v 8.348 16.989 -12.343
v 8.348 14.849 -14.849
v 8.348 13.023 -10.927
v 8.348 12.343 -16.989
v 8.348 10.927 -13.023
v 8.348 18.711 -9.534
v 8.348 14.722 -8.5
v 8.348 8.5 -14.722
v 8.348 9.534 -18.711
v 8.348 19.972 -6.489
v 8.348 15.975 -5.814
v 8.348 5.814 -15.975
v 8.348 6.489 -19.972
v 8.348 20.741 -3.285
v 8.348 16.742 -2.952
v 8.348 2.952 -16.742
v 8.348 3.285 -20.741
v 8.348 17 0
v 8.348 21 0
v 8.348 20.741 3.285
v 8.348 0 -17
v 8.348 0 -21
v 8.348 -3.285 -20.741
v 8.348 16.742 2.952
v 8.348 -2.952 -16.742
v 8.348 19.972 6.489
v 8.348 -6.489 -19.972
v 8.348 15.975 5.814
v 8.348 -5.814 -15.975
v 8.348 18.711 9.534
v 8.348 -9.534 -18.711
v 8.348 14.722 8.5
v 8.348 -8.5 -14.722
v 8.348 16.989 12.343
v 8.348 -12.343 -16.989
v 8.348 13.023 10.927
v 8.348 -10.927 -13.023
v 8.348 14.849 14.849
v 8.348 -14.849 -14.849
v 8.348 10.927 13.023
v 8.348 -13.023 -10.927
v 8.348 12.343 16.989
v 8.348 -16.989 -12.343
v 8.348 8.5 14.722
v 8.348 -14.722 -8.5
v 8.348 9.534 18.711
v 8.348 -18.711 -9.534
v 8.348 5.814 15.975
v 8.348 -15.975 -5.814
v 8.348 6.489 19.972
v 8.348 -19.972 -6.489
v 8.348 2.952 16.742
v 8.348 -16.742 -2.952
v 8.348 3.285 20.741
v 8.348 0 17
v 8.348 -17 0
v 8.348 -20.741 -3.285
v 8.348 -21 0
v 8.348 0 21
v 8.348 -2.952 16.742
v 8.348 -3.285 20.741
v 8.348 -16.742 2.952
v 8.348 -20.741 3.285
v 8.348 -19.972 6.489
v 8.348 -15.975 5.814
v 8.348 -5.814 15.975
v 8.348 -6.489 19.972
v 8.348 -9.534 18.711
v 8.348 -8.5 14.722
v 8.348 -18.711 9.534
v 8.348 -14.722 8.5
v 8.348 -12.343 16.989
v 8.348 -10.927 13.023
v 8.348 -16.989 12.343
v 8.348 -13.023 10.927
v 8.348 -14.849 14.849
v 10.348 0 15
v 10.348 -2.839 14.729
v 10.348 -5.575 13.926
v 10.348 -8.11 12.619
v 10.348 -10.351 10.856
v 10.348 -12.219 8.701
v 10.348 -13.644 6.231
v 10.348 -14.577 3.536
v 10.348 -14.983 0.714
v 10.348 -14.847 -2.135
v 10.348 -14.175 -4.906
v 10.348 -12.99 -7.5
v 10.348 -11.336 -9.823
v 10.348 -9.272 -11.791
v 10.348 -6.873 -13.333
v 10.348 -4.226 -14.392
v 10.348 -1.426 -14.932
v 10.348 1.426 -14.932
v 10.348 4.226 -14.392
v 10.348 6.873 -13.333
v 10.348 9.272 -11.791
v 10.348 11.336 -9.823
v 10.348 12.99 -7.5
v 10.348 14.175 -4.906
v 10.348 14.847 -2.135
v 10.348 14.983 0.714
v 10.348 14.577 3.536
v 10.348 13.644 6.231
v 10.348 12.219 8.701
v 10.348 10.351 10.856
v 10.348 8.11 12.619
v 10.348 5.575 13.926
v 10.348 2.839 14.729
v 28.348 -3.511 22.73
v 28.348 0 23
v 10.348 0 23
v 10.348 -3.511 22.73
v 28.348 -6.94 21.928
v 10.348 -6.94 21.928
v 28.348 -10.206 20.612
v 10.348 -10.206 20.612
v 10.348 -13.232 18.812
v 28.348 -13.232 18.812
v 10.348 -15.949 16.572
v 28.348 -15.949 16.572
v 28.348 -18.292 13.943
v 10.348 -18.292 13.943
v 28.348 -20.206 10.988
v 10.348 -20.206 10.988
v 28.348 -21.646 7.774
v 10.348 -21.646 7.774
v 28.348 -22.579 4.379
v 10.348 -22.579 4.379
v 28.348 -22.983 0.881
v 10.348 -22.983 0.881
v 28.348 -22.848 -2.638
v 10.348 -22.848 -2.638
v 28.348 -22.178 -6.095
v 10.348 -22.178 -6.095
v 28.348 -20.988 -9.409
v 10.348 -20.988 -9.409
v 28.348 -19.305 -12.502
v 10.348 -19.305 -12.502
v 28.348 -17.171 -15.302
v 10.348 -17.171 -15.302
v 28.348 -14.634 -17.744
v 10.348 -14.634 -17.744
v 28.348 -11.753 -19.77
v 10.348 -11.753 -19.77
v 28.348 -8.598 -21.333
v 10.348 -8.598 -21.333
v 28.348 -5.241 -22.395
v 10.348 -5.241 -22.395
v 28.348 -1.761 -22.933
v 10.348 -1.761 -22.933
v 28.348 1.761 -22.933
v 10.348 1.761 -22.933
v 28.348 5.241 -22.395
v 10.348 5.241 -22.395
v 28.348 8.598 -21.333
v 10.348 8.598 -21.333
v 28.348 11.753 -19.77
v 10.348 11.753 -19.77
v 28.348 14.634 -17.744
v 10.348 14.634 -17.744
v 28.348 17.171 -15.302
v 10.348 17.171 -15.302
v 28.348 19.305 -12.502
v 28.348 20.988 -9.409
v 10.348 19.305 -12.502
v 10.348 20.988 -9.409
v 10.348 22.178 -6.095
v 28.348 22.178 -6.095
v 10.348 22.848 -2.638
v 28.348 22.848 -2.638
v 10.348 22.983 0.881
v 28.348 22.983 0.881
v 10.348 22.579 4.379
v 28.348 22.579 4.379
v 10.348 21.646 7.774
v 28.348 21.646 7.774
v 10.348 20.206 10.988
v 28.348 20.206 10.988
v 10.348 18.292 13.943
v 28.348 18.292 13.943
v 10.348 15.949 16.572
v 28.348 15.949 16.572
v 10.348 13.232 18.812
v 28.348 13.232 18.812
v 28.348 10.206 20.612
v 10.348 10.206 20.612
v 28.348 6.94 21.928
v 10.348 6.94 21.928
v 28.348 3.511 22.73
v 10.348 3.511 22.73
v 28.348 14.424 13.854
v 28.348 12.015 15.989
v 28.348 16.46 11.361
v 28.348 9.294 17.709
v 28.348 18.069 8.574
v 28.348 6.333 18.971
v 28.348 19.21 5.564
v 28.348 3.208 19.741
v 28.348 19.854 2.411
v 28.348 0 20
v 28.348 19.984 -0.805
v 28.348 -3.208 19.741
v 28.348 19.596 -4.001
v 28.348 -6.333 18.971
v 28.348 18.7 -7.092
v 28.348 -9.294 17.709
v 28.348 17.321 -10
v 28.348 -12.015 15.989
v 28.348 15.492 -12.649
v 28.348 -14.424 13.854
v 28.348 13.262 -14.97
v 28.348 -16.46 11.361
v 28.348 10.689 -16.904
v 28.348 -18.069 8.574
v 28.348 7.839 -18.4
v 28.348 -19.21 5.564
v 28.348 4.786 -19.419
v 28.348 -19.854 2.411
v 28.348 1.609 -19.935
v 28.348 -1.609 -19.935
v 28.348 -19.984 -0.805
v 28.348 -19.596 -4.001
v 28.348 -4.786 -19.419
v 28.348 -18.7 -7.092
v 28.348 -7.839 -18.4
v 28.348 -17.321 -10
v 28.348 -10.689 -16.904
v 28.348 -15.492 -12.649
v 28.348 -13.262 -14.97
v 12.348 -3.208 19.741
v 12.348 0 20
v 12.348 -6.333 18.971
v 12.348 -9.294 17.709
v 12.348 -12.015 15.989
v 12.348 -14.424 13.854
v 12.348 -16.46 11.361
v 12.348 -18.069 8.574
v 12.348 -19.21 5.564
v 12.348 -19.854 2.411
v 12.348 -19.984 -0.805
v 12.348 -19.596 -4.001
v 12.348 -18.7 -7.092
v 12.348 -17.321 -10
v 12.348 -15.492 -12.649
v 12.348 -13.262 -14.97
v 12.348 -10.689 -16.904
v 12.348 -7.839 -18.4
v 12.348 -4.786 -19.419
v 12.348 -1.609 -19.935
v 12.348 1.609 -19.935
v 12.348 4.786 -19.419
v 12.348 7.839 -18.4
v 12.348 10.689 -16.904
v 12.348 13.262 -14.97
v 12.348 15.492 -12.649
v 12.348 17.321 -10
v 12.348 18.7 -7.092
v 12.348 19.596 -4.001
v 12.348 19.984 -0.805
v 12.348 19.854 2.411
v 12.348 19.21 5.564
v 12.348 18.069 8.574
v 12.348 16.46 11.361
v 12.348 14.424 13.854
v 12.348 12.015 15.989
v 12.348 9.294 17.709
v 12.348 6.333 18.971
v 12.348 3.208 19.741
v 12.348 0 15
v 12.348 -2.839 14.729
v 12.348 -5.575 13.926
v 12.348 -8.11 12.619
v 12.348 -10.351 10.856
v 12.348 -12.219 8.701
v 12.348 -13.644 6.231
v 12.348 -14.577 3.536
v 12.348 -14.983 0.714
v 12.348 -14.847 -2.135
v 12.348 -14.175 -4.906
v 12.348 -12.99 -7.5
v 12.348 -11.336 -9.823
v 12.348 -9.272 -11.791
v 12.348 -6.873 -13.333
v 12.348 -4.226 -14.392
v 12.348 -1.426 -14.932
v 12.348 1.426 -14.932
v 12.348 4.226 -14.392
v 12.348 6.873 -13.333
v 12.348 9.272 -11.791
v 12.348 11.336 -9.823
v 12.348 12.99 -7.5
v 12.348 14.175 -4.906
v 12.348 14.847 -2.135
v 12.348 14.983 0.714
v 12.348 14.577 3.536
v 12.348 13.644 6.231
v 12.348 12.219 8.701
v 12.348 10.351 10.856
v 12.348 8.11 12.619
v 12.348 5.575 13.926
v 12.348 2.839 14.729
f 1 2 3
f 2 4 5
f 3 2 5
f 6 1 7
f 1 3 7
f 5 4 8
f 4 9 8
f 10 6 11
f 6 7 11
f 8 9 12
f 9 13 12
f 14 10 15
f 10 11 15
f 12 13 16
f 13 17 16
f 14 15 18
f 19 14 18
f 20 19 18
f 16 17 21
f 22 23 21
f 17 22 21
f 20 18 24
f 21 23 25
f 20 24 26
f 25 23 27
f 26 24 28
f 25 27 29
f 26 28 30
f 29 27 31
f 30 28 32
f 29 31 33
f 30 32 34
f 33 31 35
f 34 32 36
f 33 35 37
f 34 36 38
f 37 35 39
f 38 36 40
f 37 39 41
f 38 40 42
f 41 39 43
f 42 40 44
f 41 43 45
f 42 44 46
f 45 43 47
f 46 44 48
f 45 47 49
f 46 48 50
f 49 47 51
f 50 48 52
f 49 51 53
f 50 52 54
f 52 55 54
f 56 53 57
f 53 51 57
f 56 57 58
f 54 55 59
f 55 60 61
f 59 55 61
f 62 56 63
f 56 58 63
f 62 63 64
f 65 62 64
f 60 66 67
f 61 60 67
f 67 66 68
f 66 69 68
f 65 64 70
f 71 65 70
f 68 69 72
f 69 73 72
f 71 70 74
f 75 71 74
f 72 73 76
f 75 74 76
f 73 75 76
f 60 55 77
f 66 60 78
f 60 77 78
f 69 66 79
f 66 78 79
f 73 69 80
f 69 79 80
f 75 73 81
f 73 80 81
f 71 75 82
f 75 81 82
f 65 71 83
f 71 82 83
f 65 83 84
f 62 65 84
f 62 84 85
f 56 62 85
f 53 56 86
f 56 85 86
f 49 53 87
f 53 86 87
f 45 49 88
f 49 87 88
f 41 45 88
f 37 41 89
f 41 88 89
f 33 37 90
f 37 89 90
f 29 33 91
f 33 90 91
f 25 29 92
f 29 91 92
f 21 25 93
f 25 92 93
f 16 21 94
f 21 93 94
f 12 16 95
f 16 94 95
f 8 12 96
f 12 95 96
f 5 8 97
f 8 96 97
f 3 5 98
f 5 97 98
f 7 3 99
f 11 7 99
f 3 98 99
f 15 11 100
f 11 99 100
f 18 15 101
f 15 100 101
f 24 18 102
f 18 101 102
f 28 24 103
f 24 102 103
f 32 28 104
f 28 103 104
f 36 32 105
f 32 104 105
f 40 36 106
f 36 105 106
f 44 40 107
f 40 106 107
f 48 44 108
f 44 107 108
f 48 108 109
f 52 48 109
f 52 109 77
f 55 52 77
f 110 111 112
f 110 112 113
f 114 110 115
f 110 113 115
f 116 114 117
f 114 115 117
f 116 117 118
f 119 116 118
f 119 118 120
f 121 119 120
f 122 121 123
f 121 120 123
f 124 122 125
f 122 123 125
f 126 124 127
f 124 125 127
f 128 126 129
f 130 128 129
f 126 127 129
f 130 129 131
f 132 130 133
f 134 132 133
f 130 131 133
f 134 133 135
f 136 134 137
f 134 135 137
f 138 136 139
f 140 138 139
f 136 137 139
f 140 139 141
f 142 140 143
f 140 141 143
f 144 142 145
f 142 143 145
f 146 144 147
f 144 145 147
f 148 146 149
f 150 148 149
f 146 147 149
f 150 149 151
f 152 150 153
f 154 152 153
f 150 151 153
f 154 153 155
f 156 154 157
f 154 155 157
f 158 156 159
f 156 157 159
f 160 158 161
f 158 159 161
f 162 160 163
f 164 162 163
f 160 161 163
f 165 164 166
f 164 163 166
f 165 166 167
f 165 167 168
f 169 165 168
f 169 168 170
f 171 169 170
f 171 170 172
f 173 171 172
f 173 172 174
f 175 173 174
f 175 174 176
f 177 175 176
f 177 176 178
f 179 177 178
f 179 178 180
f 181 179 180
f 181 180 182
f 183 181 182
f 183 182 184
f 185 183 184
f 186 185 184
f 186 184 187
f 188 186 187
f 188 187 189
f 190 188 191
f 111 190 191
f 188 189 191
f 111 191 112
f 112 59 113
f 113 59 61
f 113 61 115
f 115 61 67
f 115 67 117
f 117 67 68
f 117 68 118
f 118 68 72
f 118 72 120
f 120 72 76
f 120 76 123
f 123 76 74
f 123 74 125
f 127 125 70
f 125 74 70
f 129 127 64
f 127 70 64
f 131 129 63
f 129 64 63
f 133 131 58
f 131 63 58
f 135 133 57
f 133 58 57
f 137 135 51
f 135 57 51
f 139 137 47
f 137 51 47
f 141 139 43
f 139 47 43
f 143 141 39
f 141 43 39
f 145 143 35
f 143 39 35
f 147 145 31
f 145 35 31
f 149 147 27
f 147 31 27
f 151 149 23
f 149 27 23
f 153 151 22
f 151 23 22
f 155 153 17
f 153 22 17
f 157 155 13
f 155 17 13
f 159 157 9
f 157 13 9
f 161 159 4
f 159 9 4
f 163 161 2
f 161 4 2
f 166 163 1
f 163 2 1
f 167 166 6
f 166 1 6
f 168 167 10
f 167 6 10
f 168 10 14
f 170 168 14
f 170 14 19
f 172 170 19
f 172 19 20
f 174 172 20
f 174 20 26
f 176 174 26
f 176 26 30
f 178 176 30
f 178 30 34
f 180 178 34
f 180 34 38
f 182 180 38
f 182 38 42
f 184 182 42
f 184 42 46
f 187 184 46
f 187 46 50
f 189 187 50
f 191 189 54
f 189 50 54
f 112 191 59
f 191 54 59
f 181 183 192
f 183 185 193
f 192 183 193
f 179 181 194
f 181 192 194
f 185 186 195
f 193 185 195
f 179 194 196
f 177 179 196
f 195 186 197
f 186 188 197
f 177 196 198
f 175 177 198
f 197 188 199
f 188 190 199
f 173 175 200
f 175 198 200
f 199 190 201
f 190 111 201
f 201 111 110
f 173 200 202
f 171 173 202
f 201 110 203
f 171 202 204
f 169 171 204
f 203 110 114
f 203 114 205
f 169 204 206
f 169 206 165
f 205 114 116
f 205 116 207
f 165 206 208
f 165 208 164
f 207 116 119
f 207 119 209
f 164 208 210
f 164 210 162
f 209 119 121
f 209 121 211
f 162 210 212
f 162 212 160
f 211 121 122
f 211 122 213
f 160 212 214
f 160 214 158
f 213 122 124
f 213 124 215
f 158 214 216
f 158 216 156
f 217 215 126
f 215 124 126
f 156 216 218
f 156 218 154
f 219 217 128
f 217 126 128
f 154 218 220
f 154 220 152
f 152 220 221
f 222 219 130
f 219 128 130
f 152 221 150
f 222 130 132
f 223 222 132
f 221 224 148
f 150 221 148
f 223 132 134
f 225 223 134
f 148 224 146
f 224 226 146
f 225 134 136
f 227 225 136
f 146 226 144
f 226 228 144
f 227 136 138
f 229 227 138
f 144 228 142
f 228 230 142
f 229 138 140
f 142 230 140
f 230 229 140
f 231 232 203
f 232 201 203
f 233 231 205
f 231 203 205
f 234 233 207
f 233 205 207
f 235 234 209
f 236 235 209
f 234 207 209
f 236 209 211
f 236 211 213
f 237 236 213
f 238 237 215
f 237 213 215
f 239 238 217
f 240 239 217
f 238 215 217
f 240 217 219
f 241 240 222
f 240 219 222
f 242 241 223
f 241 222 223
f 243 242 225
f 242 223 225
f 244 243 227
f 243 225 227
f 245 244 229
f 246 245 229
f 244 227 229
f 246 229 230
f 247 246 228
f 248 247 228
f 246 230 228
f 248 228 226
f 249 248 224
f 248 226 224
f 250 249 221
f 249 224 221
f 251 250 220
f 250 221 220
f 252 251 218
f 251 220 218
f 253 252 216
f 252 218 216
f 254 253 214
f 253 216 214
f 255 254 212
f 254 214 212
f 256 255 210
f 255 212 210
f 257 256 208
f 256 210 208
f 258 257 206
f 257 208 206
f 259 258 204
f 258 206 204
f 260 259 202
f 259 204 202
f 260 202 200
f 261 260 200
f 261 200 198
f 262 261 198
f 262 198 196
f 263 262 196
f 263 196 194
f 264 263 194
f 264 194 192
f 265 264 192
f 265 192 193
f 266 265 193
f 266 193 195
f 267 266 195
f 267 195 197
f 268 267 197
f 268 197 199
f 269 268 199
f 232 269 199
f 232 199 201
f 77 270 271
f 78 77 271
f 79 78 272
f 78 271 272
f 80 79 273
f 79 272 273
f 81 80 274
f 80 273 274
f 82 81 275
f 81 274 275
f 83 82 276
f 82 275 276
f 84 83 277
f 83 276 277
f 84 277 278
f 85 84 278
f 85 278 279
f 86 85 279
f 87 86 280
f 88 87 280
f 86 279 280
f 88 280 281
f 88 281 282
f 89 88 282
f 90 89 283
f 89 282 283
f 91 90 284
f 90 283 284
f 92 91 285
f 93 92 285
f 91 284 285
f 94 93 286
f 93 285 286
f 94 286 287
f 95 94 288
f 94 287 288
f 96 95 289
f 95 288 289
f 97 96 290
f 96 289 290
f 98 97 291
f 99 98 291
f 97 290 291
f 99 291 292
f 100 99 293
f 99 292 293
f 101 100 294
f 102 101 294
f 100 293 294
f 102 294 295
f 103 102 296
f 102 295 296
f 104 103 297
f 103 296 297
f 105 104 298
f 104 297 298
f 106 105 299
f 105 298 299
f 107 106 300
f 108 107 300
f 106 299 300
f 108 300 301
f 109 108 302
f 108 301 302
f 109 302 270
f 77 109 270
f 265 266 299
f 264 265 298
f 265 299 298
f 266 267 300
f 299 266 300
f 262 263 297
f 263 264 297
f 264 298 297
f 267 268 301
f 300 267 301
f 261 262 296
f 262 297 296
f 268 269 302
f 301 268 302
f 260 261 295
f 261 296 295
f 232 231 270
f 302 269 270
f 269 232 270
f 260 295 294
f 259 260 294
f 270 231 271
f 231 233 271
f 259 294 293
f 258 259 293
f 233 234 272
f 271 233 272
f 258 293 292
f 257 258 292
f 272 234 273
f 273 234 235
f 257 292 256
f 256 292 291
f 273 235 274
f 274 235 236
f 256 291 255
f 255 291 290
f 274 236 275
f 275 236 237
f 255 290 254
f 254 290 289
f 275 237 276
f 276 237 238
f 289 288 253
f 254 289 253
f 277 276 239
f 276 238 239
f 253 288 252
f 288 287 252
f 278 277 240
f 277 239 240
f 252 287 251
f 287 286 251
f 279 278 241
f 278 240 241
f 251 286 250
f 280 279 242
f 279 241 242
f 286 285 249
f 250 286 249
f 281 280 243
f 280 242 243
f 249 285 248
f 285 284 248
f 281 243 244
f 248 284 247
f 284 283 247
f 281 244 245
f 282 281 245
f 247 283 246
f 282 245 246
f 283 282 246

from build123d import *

# Parameters (mm, degrees)
F3_SIZE = 2
F4_SIZE = 2


with BuildPart() as f2:
    # F0 (on Front) → F2 (revolve)
    with BuildSketch(Plane.XZ):
        Polygon((8.34782, 20), (8.34782, 15), (12.34782, 15), (12.34782, 20), (28.34782, 20), (28.34782, 23), (8.34782, 23), align=None)
    revolve(axis=Axis((1.375284, 0, 0), (1, 0, 0)))

    # F3
    f3_edges = [f2.edges().sort_by_distance(p)[0] for p in [
        (8.34782, 0, -23),
    ]]
    chamfer(f3_edges, length=F3_SIZE)

    # F4
    f4_edges = [f2.edges().sort_by_distance(p)[0] for p in [
        (8.34782, 0, -15),
    ]]
    chamfer(f4_edges, length=F4_SIZE)


solid = f2.part
